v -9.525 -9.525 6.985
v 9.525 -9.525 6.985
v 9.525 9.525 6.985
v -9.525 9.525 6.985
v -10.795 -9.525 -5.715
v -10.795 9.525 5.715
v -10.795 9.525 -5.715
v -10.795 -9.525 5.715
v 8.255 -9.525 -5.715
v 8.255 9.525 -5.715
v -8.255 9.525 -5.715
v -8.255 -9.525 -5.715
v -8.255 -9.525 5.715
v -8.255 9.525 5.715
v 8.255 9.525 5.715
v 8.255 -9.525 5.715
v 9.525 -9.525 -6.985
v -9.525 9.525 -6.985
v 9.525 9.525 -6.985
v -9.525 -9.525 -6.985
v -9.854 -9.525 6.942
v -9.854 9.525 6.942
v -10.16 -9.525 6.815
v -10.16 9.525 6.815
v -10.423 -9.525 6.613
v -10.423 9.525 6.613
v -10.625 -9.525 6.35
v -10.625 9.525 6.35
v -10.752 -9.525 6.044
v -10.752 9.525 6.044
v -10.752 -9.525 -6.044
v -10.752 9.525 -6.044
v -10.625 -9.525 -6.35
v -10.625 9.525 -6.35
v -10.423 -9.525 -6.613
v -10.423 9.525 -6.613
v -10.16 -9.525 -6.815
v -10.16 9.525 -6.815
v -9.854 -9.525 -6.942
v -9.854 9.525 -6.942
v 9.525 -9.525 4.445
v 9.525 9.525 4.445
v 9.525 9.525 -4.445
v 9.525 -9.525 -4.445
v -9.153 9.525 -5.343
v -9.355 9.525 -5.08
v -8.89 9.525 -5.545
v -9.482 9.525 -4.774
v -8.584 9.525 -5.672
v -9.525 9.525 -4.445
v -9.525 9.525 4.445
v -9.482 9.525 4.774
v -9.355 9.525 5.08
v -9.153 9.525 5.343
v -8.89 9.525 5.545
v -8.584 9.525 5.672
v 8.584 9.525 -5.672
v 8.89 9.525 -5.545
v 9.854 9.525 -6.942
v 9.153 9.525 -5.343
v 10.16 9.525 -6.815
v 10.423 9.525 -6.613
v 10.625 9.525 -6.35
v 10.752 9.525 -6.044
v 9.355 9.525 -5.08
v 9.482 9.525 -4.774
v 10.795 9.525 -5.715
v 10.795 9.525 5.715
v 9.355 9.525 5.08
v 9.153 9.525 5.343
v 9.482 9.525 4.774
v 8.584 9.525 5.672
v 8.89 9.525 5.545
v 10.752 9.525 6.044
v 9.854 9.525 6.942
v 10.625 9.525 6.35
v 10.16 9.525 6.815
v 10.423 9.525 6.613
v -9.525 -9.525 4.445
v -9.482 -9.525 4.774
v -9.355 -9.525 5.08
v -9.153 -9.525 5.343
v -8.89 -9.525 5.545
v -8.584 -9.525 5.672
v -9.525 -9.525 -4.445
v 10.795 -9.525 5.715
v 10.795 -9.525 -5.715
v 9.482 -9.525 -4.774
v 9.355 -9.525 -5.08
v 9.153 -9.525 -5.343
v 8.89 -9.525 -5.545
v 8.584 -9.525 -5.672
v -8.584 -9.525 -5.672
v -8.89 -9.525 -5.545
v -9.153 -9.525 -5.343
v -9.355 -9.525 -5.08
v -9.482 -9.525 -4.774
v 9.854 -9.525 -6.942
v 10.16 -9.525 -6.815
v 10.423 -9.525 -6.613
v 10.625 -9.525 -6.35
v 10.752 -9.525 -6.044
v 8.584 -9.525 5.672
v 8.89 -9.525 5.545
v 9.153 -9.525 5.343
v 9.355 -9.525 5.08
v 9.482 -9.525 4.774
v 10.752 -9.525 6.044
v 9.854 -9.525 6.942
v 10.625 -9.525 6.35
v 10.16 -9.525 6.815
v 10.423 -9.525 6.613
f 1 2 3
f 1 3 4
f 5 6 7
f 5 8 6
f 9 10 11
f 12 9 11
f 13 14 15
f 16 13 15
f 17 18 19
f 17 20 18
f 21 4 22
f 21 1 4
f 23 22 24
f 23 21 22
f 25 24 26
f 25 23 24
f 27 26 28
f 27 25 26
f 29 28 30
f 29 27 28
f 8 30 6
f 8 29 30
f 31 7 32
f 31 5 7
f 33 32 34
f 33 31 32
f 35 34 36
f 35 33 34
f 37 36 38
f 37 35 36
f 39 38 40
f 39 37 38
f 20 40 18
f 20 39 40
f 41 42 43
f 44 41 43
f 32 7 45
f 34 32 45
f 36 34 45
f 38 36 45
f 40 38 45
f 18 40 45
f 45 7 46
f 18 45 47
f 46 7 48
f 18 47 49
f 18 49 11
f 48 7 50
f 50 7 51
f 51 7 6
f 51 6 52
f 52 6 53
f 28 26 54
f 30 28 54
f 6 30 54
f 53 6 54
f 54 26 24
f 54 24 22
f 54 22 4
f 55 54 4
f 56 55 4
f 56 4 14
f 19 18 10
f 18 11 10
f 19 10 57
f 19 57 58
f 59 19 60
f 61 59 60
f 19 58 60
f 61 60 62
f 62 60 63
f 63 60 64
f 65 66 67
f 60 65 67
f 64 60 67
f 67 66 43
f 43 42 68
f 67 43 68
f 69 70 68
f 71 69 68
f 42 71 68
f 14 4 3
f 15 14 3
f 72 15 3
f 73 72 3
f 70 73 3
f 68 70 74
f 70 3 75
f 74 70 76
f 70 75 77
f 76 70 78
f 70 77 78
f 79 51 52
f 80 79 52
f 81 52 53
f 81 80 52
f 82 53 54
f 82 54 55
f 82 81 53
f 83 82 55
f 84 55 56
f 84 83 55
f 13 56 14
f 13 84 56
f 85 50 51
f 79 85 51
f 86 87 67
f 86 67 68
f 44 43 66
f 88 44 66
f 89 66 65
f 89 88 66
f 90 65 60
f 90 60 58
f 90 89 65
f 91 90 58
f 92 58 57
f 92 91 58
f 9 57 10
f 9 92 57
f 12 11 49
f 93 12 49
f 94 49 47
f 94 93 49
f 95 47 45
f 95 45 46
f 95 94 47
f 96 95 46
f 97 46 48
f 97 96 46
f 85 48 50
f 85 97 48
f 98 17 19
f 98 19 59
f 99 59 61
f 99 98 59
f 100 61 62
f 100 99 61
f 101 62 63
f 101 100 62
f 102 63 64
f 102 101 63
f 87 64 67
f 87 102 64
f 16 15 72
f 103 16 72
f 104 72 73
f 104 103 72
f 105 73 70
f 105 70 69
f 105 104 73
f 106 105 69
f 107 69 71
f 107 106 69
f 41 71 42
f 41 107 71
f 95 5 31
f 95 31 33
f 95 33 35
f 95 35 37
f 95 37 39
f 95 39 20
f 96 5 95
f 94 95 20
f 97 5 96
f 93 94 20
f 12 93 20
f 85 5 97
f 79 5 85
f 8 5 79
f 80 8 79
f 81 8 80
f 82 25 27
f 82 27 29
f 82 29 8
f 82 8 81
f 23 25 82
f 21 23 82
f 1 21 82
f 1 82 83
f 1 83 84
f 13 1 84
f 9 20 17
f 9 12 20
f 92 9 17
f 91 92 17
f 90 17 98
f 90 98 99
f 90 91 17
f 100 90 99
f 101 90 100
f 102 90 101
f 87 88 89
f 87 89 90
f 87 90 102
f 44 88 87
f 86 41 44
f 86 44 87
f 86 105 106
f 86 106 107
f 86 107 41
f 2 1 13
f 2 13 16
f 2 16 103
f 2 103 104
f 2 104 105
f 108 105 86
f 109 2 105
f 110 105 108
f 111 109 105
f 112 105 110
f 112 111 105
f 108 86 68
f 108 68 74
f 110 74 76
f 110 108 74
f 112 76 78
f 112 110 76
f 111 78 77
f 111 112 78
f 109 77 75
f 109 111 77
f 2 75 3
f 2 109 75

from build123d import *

# Parameters (mm, degrees)
F1_DEPTH      = 9.525
F1_DEPTH_BACK = 9.525


with BuildPart() as f1:
    # F0 (on Front) → F1 (new body, two sides)
    with BuildSketch(Plane.XZ) as f1_sk:
        with BuildLine():
            Line((-9.525, -6.985), (9.525, -6.985))
            ThreePointArc((9.525, -6.985), (10.423026, -6.613026), (10.795, -5.715))
            Line((10.795, -5.715), (10.795, 5.715))
            ThreePointArc((10.795, 5.715), (10.423026, 6.613026), (9.525, 6.985))
            Line((9.525, 6.985), (-9.525, 6.985))
            ThreePointArc((-9.525, 6.985), (-10.423026, 6.613026), (-10.795, 5.715))
            Line((-10.795, 5.715), (-10.795, -5.715))
            ThreePointArc((-10.795, -5.715), (-10.423026, -6.613026), (-9.525, -6.985))
        make_face()
        with BuildLine():
            ThreePointArc((9.525, -4.445), (9.153026, -5.343026), (8.255, -5.715))
            Line((8.255, -5.715), (-8.255, -5.715))
            ThreePointArc((-8.255, -5.715), (-9.153026, -5.343026), (-9.525, -4.445))
            Line((-9.525, -4.445), (-9.525, 4.445))
            ThreePointArc((-9.525, 4.445), (-9.153026, 5.343026), (-8.255, 5.715))
            Line((-8.255, 5.715), (8.255, 5.715))
            ThreePointArc((8.255, 5.715), (9.153026, 5.343026), (9.525, 4.445))
            Line((9.525, 4.445), (9.525, -4.445))
        make_face(mode=Mode.SUBTRACT)
    extrude(amount=F1_DEPTH)
    extrude(f1_sk.sketch, amount=-F1_DEPTH_BACK)


solid = f1.part
